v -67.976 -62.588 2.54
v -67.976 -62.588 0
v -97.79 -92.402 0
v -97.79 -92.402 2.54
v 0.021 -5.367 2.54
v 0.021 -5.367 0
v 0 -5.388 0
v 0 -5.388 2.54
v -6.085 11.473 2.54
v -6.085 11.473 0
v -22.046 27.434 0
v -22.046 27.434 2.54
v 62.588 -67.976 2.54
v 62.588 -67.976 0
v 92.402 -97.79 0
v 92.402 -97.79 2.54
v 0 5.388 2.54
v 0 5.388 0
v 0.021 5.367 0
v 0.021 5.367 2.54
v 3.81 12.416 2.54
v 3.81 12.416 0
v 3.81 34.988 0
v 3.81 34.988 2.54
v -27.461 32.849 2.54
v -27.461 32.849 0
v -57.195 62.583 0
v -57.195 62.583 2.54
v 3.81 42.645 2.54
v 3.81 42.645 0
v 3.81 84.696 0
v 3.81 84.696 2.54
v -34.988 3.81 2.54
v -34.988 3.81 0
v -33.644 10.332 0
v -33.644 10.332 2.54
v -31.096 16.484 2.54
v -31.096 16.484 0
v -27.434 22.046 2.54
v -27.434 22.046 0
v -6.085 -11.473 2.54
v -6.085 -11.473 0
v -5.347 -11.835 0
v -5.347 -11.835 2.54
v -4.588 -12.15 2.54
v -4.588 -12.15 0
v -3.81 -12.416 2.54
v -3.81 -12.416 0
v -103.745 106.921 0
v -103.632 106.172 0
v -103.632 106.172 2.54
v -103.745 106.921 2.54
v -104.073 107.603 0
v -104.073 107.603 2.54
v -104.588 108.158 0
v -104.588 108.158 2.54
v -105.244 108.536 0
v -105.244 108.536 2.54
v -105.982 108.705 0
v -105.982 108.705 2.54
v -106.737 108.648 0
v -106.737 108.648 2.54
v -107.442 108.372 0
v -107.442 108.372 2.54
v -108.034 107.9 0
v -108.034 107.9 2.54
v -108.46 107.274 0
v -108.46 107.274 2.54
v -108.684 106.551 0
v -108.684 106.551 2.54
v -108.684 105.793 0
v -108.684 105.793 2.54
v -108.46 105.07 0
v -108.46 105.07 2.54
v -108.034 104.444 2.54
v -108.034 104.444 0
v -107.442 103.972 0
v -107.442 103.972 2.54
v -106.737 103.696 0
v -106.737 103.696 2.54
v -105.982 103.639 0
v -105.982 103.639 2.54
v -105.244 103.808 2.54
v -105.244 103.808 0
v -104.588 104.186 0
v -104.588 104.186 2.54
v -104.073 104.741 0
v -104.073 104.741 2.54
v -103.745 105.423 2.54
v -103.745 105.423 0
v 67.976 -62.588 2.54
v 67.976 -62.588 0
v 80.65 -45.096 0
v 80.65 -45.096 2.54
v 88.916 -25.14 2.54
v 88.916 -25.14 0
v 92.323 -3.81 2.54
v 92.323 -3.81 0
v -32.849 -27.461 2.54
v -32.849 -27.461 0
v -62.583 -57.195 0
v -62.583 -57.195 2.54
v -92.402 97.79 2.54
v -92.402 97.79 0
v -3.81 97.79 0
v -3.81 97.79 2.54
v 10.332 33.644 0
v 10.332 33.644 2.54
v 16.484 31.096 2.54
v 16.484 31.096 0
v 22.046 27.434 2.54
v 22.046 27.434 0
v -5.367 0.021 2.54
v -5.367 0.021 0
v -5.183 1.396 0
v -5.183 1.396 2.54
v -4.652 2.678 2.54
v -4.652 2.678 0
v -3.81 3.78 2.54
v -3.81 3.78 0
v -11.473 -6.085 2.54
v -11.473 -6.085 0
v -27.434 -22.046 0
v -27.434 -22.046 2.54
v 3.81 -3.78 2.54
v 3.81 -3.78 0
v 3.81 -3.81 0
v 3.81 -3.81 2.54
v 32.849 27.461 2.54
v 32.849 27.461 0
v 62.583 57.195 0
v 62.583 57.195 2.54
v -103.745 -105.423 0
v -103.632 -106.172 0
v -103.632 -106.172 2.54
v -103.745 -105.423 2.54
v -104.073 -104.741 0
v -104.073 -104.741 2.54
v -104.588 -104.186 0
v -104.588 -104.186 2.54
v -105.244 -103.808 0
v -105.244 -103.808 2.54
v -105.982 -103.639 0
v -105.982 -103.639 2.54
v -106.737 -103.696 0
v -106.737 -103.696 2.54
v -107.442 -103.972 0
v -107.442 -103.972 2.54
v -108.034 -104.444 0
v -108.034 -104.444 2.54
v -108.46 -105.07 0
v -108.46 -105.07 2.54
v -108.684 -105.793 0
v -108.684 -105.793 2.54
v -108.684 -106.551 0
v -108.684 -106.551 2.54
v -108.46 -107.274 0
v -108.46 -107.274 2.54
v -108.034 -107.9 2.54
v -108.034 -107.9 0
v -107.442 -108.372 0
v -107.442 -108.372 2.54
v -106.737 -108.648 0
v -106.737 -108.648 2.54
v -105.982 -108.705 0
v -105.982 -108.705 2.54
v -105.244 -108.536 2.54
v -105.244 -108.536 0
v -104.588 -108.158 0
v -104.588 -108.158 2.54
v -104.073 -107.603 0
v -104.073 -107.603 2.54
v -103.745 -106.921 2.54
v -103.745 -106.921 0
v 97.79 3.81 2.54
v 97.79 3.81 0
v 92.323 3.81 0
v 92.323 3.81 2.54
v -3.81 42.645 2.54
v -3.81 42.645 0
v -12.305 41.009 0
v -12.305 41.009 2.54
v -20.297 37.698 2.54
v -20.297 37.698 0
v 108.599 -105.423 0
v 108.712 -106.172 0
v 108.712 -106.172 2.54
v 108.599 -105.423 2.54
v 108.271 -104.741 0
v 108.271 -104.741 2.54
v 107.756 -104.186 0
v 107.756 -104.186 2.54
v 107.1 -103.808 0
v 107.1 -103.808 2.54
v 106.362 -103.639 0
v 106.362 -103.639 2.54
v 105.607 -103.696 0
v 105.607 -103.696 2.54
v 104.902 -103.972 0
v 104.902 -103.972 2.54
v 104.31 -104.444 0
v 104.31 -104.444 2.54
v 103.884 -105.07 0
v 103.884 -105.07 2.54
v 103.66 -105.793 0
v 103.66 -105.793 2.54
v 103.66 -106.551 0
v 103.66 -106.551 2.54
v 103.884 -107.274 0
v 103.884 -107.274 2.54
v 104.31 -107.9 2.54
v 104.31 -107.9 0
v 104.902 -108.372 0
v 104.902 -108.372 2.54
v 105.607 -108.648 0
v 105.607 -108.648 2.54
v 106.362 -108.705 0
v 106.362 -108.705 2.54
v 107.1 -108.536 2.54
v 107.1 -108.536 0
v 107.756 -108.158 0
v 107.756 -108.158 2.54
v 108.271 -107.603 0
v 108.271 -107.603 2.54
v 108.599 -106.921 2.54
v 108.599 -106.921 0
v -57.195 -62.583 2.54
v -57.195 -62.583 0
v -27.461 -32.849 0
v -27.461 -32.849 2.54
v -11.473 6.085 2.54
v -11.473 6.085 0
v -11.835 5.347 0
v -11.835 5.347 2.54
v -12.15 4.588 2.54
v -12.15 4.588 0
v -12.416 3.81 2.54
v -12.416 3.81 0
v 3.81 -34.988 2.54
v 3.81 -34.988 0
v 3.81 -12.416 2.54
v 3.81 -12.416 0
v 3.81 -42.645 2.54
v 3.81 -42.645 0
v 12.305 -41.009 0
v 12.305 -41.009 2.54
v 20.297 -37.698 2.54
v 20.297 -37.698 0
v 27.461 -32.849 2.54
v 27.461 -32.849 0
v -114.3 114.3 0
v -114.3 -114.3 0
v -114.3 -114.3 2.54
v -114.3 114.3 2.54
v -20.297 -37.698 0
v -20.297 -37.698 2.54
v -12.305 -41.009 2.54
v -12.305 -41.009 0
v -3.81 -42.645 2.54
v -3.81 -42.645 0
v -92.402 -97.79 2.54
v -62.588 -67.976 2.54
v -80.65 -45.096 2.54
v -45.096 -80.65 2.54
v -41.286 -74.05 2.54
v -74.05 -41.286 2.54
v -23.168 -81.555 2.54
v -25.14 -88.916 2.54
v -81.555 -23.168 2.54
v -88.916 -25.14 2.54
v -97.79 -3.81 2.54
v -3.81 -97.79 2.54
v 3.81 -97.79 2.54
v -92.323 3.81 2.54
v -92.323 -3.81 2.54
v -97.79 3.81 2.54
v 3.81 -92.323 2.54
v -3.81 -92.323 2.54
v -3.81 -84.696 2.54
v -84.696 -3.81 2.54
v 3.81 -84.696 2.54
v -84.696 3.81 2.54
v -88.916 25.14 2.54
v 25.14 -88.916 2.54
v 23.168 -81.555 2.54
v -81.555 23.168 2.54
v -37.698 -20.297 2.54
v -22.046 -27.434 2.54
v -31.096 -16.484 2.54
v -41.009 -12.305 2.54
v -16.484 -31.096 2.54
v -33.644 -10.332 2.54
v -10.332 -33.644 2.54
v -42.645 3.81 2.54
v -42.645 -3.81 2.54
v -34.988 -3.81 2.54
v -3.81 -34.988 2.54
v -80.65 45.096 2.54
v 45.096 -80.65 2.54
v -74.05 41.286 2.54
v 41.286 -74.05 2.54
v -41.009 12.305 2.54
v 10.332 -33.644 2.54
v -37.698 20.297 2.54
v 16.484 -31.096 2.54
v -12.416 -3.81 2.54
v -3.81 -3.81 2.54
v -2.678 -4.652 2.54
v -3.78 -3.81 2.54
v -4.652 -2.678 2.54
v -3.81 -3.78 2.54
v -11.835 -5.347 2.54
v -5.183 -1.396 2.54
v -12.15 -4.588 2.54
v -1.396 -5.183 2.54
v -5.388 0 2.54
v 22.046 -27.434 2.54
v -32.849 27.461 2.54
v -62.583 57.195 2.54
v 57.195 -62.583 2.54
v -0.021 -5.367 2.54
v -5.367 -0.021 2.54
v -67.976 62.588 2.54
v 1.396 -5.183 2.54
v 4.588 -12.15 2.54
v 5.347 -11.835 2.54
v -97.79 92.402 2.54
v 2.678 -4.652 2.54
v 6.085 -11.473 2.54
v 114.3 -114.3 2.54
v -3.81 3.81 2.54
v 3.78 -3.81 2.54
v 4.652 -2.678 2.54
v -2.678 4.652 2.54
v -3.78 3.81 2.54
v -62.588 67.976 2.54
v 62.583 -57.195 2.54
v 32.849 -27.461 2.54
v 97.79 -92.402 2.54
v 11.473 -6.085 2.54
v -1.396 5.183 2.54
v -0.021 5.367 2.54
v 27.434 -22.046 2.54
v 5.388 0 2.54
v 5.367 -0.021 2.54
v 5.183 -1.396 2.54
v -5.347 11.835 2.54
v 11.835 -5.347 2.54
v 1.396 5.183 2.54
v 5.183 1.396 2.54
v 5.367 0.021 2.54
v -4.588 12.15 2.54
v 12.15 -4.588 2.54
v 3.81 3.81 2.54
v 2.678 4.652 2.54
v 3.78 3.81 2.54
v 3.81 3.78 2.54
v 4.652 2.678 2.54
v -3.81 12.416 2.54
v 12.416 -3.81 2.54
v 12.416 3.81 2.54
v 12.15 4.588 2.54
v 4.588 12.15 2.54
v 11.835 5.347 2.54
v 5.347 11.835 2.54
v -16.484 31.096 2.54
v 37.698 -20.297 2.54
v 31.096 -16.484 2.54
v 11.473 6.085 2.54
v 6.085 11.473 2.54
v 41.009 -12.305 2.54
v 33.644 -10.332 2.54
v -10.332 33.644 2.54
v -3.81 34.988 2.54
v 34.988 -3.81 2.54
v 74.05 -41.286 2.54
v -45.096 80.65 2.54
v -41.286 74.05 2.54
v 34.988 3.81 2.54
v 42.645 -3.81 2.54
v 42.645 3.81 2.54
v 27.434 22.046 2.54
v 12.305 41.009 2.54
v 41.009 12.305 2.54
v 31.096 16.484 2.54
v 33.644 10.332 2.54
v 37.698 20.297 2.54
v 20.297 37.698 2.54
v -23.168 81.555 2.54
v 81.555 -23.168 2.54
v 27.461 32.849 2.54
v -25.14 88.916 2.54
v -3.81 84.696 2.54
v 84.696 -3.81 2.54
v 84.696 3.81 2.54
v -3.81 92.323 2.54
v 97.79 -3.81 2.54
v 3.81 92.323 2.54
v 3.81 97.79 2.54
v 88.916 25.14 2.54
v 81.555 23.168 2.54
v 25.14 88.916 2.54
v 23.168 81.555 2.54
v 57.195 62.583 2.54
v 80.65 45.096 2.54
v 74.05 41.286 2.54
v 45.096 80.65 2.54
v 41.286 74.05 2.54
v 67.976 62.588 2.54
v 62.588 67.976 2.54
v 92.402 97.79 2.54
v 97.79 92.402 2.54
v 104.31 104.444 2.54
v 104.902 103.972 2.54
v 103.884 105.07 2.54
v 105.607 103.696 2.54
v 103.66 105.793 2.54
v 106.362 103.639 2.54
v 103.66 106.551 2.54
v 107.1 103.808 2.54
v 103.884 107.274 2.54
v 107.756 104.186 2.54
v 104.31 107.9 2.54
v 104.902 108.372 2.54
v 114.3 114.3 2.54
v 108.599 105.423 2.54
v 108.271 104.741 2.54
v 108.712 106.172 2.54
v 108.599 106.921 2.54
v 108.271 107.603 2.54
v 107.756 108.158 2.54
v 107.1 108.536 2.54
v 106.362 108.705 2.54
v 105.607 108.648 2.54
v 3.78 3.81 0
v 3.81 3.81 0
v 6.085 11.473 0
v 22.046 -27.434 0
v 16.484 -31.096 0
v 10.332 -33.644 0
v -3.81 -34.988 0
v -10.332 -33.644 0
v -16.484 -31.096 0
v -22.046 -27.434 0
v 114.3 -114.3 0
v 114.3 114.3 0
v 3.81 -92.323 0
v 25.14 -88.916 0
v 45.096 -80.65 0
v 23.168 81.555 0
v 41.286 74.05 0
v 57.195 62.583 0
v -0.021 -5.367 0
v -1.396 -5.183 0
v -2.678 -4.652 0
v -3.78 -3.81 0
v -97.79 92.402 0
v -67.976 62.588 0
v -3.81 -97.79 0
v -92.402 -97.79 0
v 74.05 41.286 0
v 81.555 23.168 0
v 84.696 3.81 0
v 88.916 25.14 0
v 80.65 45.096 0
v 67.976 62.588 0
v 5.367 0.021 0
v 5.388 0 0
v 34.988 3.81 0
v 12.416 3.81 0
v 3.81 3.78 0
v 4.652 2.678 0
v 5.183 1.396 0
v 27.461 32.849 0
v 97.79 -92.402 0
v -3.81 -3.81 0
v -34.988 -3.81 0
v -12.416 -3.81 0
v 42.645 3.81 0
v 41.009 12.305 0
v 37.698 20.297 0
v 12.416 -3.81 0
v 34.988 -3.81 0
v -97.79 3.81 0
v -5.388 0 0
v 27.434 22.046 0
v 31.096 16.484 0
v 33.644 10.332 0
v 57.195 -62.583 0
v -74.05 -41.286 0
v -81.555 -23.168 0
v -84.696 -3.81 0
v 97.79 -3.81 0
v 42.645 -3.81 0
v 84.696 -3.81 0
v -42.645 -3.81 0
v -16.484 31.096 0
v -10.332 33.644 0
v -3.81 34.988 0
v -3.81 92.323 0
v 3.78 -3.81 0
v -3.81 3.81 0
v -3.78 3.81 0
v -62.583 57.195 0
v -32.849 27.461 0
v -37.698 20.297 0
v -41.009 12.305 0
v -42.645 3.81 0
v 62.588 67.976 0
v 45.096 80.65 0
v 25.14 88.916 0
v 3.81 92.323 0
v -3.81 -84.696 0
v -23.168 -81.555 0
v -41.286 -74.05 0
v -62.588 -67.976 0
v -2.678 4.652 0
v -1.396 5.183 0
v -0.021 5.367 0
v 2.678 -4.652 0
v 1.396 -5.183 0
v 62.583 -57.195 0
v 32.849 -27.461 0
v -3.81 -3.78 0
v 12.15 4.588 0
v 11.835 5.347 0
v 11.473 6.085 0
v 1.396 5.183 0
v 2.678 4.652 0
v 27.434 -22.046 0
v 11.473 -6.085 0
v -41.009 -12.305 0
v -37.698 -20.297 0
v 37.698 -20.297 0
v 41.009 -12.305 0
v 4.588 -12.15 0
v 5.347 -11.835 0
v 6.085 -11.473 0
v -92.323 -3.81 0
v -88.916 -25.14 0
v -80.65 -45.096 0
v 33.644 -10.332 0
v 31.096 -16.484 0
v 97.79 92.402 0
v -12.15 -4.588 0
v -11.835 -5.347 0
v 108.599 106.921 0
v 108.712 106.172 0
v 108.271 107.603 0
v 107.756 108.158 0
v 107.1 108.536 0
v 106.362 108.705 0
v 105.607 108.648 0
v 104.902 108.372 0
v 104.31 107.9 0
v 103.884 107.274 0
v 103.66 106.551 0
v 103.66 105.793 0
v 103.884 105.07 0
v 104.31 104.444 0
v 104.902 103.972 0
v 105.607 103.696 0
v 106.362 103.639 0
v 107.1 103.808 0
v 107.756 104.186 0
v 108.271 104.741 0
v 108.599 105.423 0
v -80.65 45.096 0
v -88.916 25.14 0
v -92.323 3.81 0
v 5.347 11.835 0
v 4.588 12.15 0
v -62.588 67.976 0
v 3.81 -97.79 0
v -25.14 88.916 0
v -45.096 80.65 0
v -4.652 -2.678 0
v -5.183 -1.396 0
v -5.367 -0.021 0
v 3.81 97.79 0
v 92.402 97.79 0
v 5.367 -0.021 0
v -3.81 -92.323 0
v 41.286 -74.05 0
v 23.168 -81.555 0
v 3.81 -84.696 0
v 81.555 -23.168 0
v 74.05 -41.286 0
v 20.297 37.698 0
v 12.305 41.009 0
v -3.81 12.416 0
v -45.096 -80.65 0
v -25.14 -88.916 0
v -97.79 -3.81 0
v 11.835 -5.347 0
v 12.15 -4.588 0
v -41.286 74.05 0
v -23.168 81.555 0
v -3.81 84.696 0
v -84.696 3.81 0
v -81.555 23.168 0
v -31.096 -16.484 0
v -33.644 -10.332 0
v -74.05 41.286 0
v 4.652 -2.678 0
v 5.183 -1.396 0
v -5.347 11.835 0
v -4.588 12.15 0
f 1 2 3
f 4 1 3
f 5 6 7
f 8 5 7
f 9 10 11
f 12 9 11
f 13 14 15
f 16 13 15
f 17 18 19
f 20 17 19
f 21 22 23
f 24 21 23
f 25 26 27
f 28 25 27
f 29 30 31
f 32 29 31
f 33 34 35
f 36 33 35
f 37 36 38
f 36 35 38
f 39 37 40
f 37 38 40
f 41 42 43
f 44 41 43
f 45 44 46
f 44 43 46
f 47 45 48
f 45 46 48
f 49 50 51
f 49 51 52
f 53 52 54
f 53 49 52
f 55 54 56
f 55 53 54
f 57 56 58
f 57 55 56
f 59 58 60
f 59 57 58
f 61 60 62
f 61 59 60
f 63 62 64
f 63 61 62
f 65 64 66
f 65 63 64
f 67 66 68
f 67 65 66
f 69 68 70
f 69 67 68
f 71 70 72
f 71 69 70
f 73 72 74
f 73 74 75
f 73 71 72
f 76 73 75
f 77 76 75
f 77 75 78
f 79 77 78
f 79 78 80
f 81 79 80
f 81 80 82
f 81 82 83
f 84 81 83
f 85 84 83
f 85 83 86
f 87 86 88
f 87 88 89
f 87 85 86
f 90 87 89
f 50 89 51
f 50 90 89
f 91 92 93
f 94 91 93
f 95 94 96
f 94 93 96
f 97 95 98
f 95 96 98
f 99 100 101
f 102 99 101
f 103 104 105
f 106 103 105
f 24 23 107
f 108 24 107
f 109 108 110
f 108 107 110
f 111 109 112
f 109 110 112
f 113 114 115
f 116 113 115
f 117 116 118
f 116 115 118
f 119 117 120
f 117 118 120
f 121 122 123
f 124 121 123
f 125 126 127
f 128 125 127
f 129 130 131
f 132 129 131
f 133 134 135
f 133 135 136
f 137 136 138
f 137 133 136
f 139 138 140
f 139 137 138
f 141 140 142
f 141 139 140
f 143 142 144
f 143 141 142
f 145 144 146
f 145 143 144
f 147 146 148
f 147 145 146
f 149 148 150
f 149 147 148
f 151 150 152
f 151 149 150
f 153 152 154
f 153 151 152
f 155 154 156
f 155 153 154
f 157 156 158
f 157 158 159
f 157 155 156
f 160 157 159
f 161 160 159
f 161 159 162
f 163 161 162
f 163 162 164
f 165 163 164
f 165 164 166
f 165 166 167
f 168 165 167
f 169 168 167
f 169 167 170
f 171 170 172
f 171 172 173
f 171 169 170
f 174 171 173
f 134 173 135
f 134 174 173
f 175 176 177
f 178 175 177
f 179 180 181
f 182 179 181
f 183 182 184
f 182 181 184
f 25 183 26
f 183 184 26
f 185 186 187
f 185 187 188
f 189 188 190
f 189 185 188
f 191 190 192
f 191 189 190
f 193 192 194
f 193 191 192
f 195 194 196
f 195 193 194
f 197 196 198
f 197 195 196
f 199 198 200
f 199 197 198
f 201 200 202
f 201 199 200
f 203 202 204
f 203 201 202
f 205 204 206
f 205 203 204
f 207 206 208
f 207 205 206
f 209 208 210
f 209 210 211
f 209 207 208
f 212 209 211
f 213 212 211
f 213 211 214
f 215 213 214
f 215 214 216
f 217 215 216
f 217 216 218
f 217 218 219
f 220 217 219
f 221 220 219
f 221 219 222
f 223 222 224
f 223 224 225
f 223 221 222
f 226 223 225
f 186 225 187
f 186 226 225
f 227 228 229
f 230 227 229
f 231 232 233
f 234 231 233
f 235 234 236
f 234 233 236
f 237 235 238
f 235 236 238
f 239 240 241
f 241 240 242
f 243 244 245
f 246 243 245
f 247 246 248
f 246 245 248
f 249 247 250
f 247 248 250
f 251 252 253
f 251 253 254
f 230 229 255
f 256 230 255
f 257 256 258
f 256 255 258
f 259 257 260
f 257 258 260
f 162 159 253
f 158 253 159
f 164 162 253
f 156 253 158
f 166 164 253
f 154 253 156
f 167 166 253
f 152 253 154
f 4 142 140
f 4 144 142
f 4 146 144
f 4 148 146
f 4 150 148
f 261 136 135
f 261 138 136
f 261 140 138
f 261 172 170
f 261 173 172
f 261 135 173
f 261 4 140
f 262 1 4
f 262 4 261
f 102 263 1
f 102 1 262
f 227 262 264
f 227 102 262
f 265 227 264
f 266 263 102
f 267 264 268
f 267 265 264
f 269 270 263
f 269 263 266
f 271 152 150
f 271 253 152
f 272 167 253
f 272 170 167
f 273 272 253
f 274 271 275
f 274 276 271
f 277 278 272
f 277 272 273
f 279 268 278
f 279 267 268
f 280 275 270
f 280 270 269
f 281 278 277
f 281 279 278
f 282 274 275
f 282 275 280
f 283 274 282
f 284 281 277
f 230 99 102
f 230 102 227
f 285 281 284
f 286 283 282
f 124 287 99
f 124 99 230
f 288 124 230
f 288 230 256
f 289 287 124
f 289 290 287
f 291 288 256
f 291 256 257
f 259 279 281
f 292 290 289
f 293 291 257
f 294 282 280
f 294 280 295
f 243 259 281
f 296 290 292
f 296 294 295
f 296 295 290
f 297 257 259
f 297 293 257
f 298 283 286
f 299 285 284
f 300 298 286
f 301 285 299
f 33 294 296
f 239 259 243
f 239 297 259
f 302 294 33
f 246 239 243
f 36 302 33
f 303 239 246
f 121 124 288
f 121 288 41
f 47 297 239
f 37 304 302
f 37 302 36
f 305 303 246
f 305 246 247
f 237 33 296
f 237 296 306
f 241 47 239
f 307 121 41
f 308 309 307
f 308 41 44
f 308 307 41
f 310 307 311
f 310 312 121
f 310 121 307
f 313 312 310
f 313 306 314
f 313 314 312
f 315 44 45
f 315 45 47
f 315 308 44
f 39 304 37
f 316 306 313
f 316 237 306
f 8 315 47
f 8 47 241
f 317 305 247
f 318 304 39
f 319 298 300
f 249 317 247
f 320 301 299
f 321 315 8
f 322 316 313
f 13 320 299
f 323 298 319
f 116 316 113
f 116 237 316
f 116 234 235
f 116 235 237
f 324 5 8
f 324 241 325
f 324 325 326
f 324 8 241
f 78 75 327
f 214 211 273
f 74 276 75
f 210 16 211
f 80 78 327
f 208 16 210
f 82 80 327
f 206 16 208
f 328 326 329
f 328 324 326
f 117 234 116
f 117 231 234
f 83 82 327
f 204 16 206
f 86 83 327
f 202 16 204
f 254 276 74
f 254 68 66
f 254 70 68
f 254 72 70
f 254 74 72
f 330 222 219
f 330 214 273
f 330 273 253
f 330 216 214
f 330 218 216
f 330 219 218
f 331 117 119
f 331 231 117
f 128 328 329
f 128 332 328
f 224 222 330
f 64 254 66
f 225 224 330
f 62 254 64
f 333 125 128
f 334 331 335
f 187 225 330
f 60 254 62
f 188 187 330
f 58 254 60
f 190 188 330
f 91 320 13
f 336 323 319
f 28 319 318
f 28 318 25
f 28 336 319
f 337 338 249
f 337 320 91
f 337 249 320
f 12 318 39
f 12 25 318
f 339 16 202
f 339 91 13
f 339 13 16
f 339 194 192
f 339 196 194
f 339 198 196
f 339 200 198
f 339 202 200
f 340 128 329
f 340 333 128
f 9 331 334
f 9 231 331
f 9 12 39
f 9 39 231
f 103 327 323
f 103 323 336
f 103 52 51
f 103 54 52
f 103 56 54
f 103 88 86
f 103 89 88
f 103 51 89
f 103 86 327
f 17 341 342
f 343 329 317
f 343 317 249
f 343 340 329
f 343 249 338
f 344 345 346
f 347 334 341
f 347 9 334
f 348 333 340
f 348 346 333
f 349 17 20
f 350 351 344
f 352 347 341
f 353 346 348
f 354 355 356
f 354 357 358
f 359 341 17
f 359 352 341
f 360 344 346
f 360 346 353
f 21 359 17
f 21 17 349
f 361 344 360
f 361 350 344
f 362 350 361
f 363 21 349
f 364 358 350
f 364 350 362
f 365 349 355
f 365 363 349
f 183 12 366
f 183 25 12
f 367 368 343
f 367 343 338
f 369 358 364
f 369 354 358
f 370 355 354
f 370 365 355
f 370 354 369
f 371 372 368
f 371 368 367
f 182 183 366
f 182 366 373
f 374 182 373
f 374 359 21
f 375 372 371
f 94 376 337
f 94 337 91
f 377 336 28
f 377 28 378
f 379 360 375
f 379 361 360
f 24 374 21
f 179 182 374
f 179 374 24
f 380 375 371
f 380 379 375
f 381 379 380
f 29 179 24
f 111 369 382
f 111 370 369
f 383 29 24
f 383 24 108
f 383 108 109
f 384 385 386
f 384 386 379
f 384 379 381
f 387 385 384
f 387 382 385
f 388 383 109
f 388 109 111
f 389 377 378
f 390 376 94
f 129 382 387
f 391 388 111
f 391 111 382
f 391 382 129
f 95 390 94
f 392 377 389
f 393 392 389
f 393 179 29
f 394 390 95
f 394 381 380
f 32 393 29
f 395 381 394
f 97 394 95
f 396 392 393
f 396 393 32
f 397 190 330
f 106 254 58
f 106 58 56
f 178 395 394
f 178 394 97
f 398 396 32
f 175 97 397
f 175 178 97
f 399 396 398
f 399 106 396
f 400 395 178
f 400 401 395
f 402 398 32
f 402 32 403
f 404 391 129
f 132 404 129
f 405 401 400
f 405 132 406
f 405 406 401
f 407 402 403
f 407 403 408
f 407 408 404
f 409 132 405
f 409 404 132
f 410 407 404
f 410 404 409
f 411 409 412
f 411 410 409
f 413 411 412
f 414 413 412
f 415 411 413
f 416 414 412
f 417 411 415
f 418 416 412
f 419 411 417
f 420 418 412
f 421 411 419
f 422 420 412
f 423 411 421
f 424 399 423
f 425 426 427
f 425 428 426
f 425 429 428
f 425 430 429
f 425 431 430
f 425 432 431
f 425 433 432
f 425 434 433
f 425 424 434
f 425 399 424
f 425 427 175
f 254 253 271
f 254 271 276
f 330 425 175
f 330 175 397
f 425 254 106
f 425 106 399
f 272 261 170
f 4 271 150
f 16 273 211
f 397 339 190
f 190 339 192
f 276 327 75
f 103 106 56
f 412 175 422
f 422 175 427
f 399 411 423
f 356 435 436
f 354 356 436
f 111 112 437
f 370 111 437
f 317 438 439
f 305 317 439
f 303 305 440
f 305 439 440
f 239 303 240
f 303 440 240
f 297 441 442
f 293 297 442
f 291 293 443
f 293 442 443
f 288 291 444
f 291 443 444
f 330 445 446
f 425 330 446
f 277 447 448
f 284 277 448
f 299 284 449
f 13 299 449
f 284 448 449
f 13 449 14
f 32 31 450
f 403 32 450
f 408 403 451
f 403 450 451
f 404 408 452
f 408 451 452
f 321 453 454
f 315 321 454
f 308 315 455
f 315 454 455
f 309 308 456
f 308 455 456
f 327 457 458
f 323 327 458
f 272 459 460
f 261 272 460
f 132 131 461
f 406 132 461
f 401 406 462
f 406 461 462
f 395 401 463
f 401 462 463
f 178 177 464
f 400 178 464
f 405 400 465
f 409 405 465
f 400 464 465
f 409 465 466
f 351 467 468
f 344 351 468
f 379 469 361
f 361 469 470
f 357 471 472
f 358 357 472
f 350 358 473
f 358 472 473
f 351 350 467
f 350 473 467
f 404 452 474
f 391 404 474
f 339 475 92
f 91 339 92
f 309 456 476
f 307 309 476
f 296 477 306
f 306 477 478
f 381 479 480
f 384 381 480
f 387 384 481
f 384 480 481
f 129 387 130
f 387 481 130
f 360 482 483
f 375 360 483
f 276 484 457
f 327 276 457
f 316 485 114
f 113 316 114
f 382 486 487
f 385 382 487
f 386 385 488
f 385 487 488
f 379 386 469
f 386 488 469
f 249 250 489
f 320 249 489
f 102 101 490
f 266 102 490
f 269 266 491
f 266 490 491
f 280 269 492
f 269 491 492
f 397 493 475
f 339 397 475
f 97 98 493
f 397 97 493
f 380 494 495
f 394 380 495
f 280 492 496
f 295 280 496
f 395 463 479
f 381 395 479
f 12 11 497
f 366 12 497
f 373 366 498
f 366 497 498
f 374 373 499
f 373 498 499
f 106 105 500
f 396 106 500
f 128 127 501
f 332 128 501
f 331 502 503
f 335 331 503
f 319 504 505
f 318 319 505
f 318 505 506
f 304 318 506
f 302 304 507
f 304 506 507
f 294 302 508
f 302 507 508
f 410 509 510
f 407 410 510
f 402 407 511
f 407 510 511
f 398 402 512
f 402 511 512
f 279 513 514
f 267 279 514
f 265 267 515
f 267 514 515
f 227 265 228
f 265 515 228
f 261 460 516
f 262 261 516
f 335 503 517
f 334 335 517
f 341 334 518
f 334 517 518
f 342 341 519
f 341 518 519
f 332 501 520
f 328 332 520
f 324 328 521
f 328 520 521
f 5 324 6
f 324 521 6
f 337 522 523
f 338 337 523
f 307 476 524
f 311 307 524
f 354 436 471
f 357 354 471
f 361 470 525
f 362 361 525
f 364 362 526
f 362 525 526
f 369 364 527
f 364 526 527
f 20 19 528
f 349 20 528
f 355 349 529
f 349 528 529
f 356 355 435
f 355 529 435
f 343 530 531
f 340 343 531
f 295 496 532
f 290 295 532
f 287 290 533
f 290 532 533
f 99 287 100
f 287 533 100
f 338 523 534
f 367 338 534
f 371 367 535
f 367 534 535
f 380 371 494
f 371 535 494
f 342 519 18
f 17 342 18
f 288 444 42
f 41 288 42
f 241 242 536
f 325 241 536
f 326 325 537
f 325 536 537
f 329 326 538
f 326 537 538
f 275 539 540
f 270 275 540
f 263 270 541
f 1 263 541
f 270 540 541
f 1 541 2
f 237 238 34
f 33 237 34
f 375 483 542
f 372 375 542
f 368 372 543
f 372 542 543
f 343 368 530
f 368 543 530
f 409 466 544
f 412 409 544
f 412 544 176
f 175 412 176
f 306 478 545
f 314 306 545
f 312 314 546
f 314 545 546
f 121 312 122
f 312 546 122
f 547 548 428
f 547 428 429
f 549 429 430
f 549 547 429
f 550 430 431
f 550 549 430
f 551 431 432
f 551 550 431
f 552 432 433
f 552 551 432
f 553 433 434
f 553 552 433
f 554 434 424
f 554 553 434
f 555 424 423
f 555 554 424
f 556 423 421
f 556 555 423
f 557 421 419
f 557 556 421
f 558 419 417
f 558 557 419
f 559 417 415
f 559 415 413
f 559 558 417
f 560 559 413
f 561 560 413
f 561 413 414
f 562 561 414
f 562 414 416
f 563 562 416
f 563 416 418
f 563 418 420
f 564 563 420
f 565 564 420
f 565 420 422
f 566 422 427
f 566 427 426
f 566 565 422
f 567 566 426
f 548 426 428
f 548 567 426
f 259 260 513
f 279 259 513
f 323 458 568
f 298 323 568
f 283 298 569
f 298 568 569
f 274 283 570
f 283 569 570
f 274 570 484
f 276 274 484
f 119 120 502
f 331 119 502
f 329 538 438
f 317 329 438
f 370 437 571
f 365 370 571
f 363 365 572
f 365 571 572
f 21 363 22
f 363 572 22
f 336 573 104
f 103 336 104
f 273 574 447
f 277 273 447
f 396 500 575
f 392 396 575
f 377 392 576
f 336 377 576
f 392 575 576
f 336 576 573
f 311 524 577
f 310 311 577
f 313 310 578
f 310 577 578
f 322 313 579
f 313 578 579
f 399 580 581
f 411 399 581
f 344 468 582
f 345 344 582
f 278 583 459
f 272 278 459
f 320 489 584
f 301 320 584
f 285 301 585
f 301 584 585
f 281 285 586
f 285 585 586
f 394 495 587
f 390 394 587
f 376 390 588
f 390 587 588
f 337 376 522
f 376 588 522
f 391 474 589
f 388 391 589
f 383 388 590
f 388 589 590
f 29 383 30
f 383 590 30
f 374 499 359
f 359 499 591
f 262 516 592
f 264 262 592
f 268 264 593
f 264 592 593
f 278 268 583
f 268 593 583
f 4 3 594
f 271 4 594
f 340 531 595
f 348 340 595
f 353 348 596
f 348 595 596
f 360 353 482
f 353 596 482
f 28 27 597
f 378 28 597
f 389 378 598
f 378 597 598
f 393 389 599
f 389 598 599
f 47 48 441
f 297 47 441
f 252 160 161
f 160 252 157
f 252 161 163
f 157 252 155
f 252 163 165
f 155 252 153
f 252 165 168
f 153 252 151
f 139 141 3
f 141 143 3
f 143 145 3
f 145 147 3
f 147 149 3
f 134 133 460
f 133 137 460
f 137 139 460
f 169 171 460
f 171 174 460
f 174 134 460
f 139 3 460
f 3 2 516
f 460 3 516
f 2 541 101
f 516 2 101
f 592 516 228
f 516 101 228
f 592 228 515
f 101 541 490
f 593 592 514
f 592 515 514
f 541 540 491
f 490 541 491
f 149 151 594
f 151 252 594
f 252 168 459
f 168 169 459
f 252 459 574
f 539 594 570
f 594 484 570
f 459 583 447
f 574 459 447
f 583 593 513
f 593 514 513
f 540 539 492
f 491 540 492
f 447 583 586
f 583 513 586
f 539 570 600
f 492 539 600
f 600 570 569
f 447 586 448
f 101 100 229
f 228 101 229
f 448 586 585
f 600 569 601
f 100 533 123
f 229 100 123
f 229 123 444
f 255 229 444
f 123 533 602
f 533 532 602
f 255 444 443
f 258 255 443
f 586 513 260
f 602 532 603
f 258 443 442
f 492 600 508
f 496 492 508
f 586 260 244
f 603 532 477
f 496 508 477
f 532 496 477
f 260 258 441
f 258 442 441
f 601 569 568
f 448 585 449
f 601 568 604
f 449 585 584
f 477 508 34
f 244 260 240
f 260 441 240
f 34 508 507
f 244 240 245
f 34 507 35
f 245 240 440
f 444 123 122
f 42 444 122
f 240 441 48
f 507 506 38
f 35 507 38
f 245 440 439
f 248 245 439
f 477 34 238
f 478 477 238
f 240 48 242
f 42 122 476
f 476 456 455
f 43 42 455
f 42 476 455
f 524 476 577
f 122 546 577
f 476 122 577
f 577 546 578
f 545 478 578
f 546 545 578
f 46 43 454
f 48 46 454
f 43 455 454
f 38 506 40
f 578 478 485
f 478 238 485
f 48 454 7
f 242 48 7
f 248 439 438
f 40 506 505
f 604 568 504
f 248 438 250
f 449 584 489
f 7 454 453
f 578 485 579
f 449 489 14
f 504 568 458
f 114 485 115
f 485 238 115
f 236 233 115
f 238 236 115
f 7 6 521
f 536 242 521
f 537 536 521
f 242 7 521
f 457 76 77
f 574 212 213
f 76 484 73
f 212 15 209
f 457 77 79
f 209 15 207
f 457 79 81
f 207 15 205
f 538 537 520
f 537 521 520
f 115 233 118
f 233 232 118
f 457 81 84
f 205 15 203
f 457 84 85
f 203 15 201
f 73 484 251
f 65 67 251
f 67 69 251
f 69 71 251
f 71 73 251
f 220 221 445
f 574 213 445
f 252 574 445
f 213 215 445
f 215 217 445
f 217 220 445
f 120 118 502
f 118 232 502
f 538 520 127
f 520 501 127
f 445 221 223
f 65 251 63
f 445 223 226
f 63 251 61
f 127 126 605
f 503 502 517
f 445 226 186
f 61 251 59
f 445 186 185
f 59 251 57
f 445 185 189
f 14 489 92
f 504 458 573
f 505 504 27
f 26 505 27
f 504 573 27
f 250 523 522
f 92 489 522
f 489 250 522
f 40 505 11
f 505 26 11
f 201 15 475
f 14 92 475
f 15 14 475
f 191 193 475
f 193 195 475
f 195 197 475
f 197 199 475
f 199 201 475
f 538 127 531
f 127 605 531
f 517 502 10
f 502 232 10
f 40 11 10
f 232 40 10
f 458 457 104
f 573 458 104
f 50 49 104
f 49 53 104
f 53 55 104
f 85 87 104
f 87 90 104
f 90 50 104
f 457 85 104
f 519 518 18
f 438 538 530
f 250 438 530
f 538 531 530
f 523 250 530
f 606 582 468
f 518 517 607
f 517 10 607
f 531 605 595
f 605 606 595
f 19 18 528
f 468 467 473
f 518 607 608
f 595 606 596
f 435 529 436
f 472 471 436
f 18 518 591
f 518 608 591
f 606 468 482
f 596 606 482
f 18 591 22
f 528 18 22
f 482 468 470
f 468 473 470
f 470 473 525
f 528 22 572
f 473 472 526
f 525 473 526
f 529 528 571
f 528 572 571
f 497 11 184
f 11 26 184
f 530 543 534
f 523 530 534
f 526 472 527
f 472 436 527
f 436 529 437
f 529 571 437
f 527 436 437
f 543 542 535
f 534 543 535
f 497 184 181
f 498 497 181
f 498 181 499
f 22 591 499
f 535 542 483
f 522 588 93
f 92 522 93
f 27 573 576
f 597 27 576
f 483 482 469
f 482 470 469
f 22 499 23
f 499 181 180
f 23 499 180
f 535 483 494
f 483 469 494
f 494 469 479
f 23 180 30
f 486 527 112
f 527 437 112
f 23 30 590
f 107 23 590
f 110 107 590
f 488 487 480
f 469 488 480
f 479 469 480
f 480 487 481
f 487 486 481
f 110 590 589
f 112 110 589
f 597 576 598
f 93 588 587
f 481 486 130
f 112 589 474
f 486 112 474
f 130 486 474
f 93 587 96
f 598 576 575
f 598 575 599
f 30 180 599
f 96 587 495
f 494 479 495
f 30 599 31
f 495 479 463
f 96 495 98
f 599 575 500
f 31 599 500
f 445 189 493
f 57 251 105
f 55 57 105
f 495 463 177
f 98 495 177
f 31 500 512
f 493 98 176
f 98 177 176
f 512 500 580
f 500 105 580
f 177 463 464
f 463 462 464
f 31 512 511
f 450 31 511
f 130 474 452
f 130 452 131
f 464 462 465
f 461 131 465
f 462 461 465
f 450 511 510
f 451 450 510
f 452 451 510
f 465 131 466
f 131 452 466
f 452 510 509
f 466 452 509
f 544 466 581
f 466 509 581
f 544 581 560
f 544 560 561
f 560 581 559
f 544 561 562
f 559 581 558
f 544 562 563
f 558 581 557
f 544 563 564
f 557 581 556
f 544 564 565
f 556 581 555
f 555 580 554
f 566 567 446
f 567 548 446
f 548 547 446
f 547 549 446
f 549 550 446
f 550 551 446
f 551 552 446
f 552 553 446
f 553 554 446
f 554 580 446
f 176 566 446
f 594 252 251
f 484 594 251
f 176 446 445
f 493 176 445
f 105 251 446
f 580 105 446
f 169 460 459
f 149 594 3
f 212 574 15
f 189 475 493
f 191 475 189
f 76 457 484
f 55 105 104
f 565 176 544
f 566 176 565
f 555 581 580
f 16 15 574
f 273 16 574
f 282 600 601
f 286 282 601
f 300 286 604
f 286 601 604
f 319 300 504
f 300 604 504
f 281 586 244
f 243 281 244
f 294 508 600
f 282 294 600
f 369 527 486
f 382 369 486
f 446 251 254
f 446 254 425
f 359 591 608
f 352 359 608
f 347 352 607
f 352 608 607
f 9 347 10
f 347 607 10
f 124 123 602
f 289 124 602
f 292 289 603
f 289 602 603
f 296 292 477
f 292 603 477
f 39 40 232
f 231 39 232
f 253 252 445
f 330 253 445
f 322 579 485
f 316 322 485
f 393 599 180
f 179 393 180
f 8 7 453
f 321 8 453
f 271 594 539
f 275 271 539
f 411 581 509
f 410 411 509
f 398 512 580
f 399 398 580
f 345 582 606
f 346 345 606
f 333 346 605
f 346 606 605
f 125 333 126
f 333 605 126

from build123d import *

# Parameters (mm, degrees)
SKETCH1_W           = 228.6
SKETCH1_H           = 228.6
SKETCH1_R           = 2.54
BOSS_EXTRUDE1_DEPTH = 2.54


with BuildPart() as part:
    # Sketch1 → Boss-Extrude1 (new body)
    with BuildSketch(Plane.XY):
        Rectangle(SKETCH1_W, SKETCH1_H)
        with Locations((-106.172, -106.172)):
            Circle(SKETCH1_R, mode=Mode.SUBTRACT)
        with BuildLine():
            Line((-3.81, -97.79), (-92.401846327, -97.79))
            Line((-92.401846327, -97.79), (-62.588329311, -67.976482983))
            ThreePointArc((-62.588329311, -67.976482983), (-35.360655709, -85.368174588), (-3.81, -92.323264158))
            Line((-3.81, -92.323264158), (-3.81, -97.79))
        make_face(mode=Mode.SUBTRACT)
        with BuildLine():
            ThreePointArc((-3.81, -84.696194523), (-32.444607955, -78.32821255), (-57.195176652, -62.583330324))
            Line((-57.195176652, -62.583330324), (-27.460573831, -32.848727503))
            ThreePointArc((-27.460573831, -32.848727503), (-16.384581274, -39.555878326), (-3.81, -42.645115942))
            Line((-3.81, -42.645115942), (-3.81, -84.696194523))
        make_face(mode=Mode.SUBTRACT)
        with BuildLine():
            Line((-67.976482983, -62.588329311), (-97.79, -92.401846327))
            Line((-97.79, -92.401846327), (-97.79, -3.81))
            Line((-97.79, -3.81), (-92.323264158, -3.81))
            ThreePointArc((-92.323264158, -3.81), (-85.368174588, -35.360655709), (-67.976482983, -62.588329311))
        make_face(mode=Mode.SUBTRACT)
        with BuildLine():
            ThreePointArc((-62.583330324, -57.195176652), (-78.32821255, -32.444607955), (-84.696194523, -3.81))
            Line((-84.696194523, -3.81), (-42.645115942, -3.81))
            ThreePointArc((-42.645115942, -3.81), (-39.555878326, -16.384581274), (-32.848727503, -27.460573831))
            Line((-32.848727503, -27.460573831), (-62.583330324, -57.195176652))
        make_face(mode=Mode.SUBTRACT)
        with BuildLine():
            Line((-3.81, -12.415847502), (-3.81, -34.988142381))
            ThreePointArc((-3.81, -34.988142381), (-13.46853352, -32.515916289), (-22.046275902, -27.434429575))
            Line((-22.046275902, -27.434429575), (-6.085253126, -11.473406799))
            ThreePointArc((-6.085253126, -11.473406799), (-4.970015818, -11.998679592), (-3.81, -12.415847502))
        make_face(mode=Mode.SUBTRACT)
        with BuildLine():
            ThreePointArc((-27.434429575, -22.046275902), (-32.515916289, -13.46853352), (-34.988142381, -3.81))
            Line((-34.988142381, -3.81), (-12.415847502, -3.81))
            ThreePointArc((-12.415847502, -3.81), (-11.998679592, -4.970015818), (-11.473406799, -6.085253126))
            Line((-11.473406799, -6.085253126), (-27.434429575, -22.046275902))
        make_face(mode=Mode.SUBTRACT)
        with BuildLine():
            ThreePointArc((3.81, -92.323264158), (35.360655709, -85.368174588), (62.588329311, -67.976482983))
            Line((62.588329311, -67.976482983), (92.401846327, -97.79))
            Line((92.401846327, -97.79), (3.81, -97.79))
            Line((3.81, -97.79), (3.81, -92.323264158))
        make_face(mode=Mode.SUBTRACT)
        with BuildLine():
            ThreePointArc((3.81, -42.645115942), (16.384581274, -39.555878326), (27.460573831, -32.848727503))
            Line((27.460573831, -32.848727503), (57.195176652, -62.583330324))
            ThreePointArc((57.195176652, -62.583330324), (32.444607955, -78.32821255), (3.81, -84.696194523))
            Line((3.81, -84.696194523), (3.81, -42.645115942))
        make_face(mode=Mode.SUBTRACT)
        with Locations((106.172, -106.172)):
            Circle(SKETCH1_R, mode=Mode.SUBTRACT)
        with BuildLine():
            ThreePointArc((3.81, -12.415847502), (4.970015818, -11.998679592), (6.085253126, -11.473406799))
            Line((6.085253126, -11.473406799), (22.046275902, -27.434429575))
            ThreePointArc((22.046275902, -27.434429575), (13.46853352, -32.515916289), (3.81, -34.988142381))
            Line((3.81, -34.988142381), (3.81, -12.415847502))
        make_face(mode=Mode.SUBTRACT)
        with BuildLine():
            Line((27.434429575, -22.046275902), (11.473406799, -6.085253126))
            ThreePointArc((11.473406799, -6.085253126), (11.998679592, -4.970015818), (12.415847502, -3.81))
            Line((12.415847502, -3.81), (34.988142381, -3.81))
            ThreePointArc((34.988142381, -3.81), (32.515916289, -13.46853352), (27.434429575, -22.046275902))
        make_face(mode=Mode.SUBTRACT)
        with BuildLine():
            Line((97.79, -92.401846327), (67.976482983, -62.588329311))
            ThreePointArc((67.976482983, -62.588329311), (85.368174588, -35.360655709), (92.323264158, -3.81))
            Line((92.323264158, -3.81), (97.79, -3.81))
            Line((97.79, -3.81), (97.79, -92.401846327))
        make_face(mode=Mode.SUBTRACT)
        with BuildLine():
            ThreePointArc((32.848727503, -27.460573831), (39.555878326, -16.384581274), (42.645115942, -3.81))
            Line((42.645115942, -3.81), (84.696194523, -3.81))
            ThreePointArc((84.696194523, -3.81), (78.32821255, -32.444607955), (62.583330324, -57.195176652))
            Line((62.583330324, -57.195176652), (32.848727503, -27.460573831))
        make_face(mode=Mode.SUBTRACT)
        with BuildLine():
            Line((-42.645115942, 3.81), (-84.696194523, 3.81))
            ThreePointArc((-84.696194523, 3.81), (-78.32821255, 32.444607955), (-62.583330324, 57.195176652))
            Line((-62.583330324, 57.195176652), (-32.848727503, 27.460573831))
            ThreePointArc((-32.848727503, 27.460573831), (-39.555878326, 16.384581274), (-42.645115942, 3.81))
        make_face(mode=Mode.SUBTRACT)
        with BuildLine():
            Line((-97.79, 3.81), (-97.79, 92.401846327))
            Line((-97.79, 92.401846327), (-67.976482983, 62.588329311))
            ThreePointArc((-67.976482983, 62.588329311), (-85.368174588, 35.360655709), (-92.323264158, 3.81))
            Line((-92.323264158, 3.81), (-97.79, 3.81))
        make_face(mode=Mode.SUBTRACT)
        with BuildLine():
            ThreePointArc((-34.988142381, 3.81), (-32.515916289, 13.46853352), (-27.434429575, 22.046275902))
            Line((-27.434429575, 22.046275902), (-11.473406799, 6.085253126))
            ThreePointArc((-11.473406799, 6.085253126), (-11.998679592, 4.970015818), (-12.415847502, 3.81))
            Line((-12.415847502, 3.81), (-34.988142381, 3.81))
        make_face(mode=Mode.SUBTRACT)
        with BuildLine():
            Line((-3.81, 34.988142381), (-3.81, 12.415847502))
            ThreePointArc((-3.81, 12.415847502), (-4.970015818, 11.998679592), (-6.085253126, 11.473406799))
            Line((-6.085253126, 11.473406799), (-22.046275902, 27.434429575))
            ThreePointArc((-22.046275902, 27.434429575), (-13.46853352, 32.515916289), (-3.81, 34.988142381))
        make_face(mode=Mode.SUBTRACT)
        with Locations((-106.172, 106.172)):
            Circle(SKETCH1_R, mode=Mode.SUBTRACT)
        with BuildLine():
            Line((-27.460573831, 32.848727503), (-57.195176652, 62.583330324))
            ThreePointArc((-57.195176652, 62.583330324), (-32.444607955, 78.32821255), (-3.81, 84.696194523))
            Line((-3.81, 84.696194523), (-3.81, 42.645115942))
            ThreePointArc((-3.81, 42.645115942), (-16.384581274, 39.555878326), (-27.460573831, 32.848727503))
        make_face(mode=Mode.SUBTRACT)
        with BuildLine():
            Line((-62.588329311, 67.976482983), (-92.401846327, 97.79))
            Line((-92.401846327, 97.79), (-3.81, 97.79))
            Line((-3.81, 97.79), (-3.81, 92.323264158))
            ThreePointArc((-3.81, 92.323264158), (-35.360655709, 85.368174588), (-62.588329311, 67.976482983))
        make_face(mode=Mode.SUBTRACT)
        with BuildLine():
            Line((0.020917227, -5.367236445), (0, -5.388153673))
            Line((0, -5.388153673), (-0.020917227, -5.367236445))
            ThreePointArc((-0.020917227, -5.367236445), (-2.053968063, -4.958717554), (-3.780418573, -3.81))
            Line((-3.780418573, -3.81), (-3.81, -3.81))
            Line((-3.81, -3.81), (-3.81, -3.780418573))
            ThreePointArc((-3.81, -3.780418573), (-4.958717554, -2.053968063), (-5.367236445, -0.020917227))
            Line((-5.367236445, -0.020917227), (-5.388153673, 0))
            Line((-5.388153673, 0), (-5.367236445, 0.020917227))
            ThreePointArc((-5.367236445, 0.020917227), (-4.958717554, 2.053968063), (-3.81, 3.780418573))
            Line((-3.81, 3.780418573), (-3.81, 3.81))
            Line((-3.81, 3.81), (-3.780418573, 3.81))
            ThreePointArc((-3.780418573, 3.81), (-2.053968063, 4.958717554), (-0.020917227, 5.367236445))
            Line((-0.020917227, 5.367236445), (0, 5.388153673))
            Line((0, 5.388153673), (0.020917227, 5.367236445))
            ThreePointArc((0.020917227, 5.367236445), (2.053968063, 4.958717554), (3.780418573, 3.81))
            Line((3.780418573, 3.81), (3.81, 3.81))
            Line((3.81, 3.81), (3.81, 3.780418573))
            ThreePointArc((3.81, 3.780418573), (4.958717554, 2.053968063), (5.367236445, 0.020917227))
            Line((5.367236445, 0.020917227), (5.388153673, 0))
            Line((5.388153673, 0), (5.367236445, -0.020917227))
            ThreePointArc((5.367236445, -0.020917227), (4.958717554, -2.053968063), (3.81, -3.780418573))
            Line((3.81, -3.780418573), (3.81, -3.81))
            Line((3.81, -3.81), (3.780418573, -3.81))
            ThreePointArc((3.780418573, -3.81), (2.053968063, -4.958717554), (0.020917227, -5.367236445))
        make_face(mode=Mode.SUBTRACT)
        with BuildLine():
            Line((34.988142381, 3.81), (12.415847502, 3.81))
            ThreePointArc((12.415847502, 3.81), (11.998679592, 4.970015818), (11.473406799, 6.085253126))
            Line((11.473406799, 6.085253126), (27.434429575, 22.046275902))
            ThreePointArc((27.434429575, 22.046275902), (32.515916289, 13.46853352), (34.988142381, 3.81))
        make_face(mode=Mode.SUBTRACT)
        with BuildLine():
            Line((22.046275902, 27.434429575), (6.085253126, 11.473406799))
            ThreePointArc((6.085253126, 11.473406799), (4.970015818, 11.998679592), (3.81, 12.415847502))
            Line((3.81, 12.415847502), (3.81, 34.988142381))
            ThreePointArc((3.81, 34.988142381), (13.46853352, 32.515916289), (22.046275902, 27.434429575))
        make_face(mode=Mode.SUBTRACT)
        with BuildLine():
            ThreePointArc((42.645115942, 3.81), (39.555878326, 16.384581274), (32.848727503, 27.460573831))
            Line((32.848727503, 27.460573831), (62.583330324, 57.195176652))
            ThreePointArc((62.583330324, 57.195176652), (78.32821255, 32.444607955), (84.696194523, 3.81))
            Line((84.696194523, 3.81), (42.645115942, 3.81))
        make_face(mode=Mode.SUBTRACT)
        with BuildLine():
            Line((97.79, 92.401846327), (97.79, 3.81))
            Line((97.79, 3.81), (92.323264158, 3.81))
            ThreePointArc((92.323264158, 3.81), (85.368174588, 35.360655709), (67.976482983, 62.588329311))
            Line((67.976482983, 62.588329311), (97.79, 92.401846327))
        make_face(mode=Mode.SUBTRACT)
        with BuildLine():
            Line((57.195176652, 62.583330324), (27.460573831, 32.848727503))
            ThreePointArc((27.460573831, 32.848727503), (16.384581274, 39.555878326), (3.81, 42.645115942))
            Line((3.81, 42.645115942), (3.81, 84.696194523))
            ThreePointArc((3.81, 84.696194523), (32.444607955, 78.32821255), (57.195176652, 62.583330324))
        make_face(mode=Mode.SUBTRACT)
        with BuildLine():
            ThreePointArc((62.588329311, 67.976482983), (35.360655709, 85.368174588), (3.81, 92.323264158))
            Line((3.81, 92.323264158), (3.81, 97.79))
            Line((3.81, 97.79), (92.401846327, 97.79))
            Line((92.401846327, 97.79), (62.588329311, 67.976482983))
        make_face(mode=Mode.SUBTRACT)
        with Locations((106.172, 106.172)):
            Circle(SKETCH1_R, mode=Mode.SUBTRACT)
    extrude(amount=BOSS_EXTRUDE1_DEPTH)


solid = part.part
